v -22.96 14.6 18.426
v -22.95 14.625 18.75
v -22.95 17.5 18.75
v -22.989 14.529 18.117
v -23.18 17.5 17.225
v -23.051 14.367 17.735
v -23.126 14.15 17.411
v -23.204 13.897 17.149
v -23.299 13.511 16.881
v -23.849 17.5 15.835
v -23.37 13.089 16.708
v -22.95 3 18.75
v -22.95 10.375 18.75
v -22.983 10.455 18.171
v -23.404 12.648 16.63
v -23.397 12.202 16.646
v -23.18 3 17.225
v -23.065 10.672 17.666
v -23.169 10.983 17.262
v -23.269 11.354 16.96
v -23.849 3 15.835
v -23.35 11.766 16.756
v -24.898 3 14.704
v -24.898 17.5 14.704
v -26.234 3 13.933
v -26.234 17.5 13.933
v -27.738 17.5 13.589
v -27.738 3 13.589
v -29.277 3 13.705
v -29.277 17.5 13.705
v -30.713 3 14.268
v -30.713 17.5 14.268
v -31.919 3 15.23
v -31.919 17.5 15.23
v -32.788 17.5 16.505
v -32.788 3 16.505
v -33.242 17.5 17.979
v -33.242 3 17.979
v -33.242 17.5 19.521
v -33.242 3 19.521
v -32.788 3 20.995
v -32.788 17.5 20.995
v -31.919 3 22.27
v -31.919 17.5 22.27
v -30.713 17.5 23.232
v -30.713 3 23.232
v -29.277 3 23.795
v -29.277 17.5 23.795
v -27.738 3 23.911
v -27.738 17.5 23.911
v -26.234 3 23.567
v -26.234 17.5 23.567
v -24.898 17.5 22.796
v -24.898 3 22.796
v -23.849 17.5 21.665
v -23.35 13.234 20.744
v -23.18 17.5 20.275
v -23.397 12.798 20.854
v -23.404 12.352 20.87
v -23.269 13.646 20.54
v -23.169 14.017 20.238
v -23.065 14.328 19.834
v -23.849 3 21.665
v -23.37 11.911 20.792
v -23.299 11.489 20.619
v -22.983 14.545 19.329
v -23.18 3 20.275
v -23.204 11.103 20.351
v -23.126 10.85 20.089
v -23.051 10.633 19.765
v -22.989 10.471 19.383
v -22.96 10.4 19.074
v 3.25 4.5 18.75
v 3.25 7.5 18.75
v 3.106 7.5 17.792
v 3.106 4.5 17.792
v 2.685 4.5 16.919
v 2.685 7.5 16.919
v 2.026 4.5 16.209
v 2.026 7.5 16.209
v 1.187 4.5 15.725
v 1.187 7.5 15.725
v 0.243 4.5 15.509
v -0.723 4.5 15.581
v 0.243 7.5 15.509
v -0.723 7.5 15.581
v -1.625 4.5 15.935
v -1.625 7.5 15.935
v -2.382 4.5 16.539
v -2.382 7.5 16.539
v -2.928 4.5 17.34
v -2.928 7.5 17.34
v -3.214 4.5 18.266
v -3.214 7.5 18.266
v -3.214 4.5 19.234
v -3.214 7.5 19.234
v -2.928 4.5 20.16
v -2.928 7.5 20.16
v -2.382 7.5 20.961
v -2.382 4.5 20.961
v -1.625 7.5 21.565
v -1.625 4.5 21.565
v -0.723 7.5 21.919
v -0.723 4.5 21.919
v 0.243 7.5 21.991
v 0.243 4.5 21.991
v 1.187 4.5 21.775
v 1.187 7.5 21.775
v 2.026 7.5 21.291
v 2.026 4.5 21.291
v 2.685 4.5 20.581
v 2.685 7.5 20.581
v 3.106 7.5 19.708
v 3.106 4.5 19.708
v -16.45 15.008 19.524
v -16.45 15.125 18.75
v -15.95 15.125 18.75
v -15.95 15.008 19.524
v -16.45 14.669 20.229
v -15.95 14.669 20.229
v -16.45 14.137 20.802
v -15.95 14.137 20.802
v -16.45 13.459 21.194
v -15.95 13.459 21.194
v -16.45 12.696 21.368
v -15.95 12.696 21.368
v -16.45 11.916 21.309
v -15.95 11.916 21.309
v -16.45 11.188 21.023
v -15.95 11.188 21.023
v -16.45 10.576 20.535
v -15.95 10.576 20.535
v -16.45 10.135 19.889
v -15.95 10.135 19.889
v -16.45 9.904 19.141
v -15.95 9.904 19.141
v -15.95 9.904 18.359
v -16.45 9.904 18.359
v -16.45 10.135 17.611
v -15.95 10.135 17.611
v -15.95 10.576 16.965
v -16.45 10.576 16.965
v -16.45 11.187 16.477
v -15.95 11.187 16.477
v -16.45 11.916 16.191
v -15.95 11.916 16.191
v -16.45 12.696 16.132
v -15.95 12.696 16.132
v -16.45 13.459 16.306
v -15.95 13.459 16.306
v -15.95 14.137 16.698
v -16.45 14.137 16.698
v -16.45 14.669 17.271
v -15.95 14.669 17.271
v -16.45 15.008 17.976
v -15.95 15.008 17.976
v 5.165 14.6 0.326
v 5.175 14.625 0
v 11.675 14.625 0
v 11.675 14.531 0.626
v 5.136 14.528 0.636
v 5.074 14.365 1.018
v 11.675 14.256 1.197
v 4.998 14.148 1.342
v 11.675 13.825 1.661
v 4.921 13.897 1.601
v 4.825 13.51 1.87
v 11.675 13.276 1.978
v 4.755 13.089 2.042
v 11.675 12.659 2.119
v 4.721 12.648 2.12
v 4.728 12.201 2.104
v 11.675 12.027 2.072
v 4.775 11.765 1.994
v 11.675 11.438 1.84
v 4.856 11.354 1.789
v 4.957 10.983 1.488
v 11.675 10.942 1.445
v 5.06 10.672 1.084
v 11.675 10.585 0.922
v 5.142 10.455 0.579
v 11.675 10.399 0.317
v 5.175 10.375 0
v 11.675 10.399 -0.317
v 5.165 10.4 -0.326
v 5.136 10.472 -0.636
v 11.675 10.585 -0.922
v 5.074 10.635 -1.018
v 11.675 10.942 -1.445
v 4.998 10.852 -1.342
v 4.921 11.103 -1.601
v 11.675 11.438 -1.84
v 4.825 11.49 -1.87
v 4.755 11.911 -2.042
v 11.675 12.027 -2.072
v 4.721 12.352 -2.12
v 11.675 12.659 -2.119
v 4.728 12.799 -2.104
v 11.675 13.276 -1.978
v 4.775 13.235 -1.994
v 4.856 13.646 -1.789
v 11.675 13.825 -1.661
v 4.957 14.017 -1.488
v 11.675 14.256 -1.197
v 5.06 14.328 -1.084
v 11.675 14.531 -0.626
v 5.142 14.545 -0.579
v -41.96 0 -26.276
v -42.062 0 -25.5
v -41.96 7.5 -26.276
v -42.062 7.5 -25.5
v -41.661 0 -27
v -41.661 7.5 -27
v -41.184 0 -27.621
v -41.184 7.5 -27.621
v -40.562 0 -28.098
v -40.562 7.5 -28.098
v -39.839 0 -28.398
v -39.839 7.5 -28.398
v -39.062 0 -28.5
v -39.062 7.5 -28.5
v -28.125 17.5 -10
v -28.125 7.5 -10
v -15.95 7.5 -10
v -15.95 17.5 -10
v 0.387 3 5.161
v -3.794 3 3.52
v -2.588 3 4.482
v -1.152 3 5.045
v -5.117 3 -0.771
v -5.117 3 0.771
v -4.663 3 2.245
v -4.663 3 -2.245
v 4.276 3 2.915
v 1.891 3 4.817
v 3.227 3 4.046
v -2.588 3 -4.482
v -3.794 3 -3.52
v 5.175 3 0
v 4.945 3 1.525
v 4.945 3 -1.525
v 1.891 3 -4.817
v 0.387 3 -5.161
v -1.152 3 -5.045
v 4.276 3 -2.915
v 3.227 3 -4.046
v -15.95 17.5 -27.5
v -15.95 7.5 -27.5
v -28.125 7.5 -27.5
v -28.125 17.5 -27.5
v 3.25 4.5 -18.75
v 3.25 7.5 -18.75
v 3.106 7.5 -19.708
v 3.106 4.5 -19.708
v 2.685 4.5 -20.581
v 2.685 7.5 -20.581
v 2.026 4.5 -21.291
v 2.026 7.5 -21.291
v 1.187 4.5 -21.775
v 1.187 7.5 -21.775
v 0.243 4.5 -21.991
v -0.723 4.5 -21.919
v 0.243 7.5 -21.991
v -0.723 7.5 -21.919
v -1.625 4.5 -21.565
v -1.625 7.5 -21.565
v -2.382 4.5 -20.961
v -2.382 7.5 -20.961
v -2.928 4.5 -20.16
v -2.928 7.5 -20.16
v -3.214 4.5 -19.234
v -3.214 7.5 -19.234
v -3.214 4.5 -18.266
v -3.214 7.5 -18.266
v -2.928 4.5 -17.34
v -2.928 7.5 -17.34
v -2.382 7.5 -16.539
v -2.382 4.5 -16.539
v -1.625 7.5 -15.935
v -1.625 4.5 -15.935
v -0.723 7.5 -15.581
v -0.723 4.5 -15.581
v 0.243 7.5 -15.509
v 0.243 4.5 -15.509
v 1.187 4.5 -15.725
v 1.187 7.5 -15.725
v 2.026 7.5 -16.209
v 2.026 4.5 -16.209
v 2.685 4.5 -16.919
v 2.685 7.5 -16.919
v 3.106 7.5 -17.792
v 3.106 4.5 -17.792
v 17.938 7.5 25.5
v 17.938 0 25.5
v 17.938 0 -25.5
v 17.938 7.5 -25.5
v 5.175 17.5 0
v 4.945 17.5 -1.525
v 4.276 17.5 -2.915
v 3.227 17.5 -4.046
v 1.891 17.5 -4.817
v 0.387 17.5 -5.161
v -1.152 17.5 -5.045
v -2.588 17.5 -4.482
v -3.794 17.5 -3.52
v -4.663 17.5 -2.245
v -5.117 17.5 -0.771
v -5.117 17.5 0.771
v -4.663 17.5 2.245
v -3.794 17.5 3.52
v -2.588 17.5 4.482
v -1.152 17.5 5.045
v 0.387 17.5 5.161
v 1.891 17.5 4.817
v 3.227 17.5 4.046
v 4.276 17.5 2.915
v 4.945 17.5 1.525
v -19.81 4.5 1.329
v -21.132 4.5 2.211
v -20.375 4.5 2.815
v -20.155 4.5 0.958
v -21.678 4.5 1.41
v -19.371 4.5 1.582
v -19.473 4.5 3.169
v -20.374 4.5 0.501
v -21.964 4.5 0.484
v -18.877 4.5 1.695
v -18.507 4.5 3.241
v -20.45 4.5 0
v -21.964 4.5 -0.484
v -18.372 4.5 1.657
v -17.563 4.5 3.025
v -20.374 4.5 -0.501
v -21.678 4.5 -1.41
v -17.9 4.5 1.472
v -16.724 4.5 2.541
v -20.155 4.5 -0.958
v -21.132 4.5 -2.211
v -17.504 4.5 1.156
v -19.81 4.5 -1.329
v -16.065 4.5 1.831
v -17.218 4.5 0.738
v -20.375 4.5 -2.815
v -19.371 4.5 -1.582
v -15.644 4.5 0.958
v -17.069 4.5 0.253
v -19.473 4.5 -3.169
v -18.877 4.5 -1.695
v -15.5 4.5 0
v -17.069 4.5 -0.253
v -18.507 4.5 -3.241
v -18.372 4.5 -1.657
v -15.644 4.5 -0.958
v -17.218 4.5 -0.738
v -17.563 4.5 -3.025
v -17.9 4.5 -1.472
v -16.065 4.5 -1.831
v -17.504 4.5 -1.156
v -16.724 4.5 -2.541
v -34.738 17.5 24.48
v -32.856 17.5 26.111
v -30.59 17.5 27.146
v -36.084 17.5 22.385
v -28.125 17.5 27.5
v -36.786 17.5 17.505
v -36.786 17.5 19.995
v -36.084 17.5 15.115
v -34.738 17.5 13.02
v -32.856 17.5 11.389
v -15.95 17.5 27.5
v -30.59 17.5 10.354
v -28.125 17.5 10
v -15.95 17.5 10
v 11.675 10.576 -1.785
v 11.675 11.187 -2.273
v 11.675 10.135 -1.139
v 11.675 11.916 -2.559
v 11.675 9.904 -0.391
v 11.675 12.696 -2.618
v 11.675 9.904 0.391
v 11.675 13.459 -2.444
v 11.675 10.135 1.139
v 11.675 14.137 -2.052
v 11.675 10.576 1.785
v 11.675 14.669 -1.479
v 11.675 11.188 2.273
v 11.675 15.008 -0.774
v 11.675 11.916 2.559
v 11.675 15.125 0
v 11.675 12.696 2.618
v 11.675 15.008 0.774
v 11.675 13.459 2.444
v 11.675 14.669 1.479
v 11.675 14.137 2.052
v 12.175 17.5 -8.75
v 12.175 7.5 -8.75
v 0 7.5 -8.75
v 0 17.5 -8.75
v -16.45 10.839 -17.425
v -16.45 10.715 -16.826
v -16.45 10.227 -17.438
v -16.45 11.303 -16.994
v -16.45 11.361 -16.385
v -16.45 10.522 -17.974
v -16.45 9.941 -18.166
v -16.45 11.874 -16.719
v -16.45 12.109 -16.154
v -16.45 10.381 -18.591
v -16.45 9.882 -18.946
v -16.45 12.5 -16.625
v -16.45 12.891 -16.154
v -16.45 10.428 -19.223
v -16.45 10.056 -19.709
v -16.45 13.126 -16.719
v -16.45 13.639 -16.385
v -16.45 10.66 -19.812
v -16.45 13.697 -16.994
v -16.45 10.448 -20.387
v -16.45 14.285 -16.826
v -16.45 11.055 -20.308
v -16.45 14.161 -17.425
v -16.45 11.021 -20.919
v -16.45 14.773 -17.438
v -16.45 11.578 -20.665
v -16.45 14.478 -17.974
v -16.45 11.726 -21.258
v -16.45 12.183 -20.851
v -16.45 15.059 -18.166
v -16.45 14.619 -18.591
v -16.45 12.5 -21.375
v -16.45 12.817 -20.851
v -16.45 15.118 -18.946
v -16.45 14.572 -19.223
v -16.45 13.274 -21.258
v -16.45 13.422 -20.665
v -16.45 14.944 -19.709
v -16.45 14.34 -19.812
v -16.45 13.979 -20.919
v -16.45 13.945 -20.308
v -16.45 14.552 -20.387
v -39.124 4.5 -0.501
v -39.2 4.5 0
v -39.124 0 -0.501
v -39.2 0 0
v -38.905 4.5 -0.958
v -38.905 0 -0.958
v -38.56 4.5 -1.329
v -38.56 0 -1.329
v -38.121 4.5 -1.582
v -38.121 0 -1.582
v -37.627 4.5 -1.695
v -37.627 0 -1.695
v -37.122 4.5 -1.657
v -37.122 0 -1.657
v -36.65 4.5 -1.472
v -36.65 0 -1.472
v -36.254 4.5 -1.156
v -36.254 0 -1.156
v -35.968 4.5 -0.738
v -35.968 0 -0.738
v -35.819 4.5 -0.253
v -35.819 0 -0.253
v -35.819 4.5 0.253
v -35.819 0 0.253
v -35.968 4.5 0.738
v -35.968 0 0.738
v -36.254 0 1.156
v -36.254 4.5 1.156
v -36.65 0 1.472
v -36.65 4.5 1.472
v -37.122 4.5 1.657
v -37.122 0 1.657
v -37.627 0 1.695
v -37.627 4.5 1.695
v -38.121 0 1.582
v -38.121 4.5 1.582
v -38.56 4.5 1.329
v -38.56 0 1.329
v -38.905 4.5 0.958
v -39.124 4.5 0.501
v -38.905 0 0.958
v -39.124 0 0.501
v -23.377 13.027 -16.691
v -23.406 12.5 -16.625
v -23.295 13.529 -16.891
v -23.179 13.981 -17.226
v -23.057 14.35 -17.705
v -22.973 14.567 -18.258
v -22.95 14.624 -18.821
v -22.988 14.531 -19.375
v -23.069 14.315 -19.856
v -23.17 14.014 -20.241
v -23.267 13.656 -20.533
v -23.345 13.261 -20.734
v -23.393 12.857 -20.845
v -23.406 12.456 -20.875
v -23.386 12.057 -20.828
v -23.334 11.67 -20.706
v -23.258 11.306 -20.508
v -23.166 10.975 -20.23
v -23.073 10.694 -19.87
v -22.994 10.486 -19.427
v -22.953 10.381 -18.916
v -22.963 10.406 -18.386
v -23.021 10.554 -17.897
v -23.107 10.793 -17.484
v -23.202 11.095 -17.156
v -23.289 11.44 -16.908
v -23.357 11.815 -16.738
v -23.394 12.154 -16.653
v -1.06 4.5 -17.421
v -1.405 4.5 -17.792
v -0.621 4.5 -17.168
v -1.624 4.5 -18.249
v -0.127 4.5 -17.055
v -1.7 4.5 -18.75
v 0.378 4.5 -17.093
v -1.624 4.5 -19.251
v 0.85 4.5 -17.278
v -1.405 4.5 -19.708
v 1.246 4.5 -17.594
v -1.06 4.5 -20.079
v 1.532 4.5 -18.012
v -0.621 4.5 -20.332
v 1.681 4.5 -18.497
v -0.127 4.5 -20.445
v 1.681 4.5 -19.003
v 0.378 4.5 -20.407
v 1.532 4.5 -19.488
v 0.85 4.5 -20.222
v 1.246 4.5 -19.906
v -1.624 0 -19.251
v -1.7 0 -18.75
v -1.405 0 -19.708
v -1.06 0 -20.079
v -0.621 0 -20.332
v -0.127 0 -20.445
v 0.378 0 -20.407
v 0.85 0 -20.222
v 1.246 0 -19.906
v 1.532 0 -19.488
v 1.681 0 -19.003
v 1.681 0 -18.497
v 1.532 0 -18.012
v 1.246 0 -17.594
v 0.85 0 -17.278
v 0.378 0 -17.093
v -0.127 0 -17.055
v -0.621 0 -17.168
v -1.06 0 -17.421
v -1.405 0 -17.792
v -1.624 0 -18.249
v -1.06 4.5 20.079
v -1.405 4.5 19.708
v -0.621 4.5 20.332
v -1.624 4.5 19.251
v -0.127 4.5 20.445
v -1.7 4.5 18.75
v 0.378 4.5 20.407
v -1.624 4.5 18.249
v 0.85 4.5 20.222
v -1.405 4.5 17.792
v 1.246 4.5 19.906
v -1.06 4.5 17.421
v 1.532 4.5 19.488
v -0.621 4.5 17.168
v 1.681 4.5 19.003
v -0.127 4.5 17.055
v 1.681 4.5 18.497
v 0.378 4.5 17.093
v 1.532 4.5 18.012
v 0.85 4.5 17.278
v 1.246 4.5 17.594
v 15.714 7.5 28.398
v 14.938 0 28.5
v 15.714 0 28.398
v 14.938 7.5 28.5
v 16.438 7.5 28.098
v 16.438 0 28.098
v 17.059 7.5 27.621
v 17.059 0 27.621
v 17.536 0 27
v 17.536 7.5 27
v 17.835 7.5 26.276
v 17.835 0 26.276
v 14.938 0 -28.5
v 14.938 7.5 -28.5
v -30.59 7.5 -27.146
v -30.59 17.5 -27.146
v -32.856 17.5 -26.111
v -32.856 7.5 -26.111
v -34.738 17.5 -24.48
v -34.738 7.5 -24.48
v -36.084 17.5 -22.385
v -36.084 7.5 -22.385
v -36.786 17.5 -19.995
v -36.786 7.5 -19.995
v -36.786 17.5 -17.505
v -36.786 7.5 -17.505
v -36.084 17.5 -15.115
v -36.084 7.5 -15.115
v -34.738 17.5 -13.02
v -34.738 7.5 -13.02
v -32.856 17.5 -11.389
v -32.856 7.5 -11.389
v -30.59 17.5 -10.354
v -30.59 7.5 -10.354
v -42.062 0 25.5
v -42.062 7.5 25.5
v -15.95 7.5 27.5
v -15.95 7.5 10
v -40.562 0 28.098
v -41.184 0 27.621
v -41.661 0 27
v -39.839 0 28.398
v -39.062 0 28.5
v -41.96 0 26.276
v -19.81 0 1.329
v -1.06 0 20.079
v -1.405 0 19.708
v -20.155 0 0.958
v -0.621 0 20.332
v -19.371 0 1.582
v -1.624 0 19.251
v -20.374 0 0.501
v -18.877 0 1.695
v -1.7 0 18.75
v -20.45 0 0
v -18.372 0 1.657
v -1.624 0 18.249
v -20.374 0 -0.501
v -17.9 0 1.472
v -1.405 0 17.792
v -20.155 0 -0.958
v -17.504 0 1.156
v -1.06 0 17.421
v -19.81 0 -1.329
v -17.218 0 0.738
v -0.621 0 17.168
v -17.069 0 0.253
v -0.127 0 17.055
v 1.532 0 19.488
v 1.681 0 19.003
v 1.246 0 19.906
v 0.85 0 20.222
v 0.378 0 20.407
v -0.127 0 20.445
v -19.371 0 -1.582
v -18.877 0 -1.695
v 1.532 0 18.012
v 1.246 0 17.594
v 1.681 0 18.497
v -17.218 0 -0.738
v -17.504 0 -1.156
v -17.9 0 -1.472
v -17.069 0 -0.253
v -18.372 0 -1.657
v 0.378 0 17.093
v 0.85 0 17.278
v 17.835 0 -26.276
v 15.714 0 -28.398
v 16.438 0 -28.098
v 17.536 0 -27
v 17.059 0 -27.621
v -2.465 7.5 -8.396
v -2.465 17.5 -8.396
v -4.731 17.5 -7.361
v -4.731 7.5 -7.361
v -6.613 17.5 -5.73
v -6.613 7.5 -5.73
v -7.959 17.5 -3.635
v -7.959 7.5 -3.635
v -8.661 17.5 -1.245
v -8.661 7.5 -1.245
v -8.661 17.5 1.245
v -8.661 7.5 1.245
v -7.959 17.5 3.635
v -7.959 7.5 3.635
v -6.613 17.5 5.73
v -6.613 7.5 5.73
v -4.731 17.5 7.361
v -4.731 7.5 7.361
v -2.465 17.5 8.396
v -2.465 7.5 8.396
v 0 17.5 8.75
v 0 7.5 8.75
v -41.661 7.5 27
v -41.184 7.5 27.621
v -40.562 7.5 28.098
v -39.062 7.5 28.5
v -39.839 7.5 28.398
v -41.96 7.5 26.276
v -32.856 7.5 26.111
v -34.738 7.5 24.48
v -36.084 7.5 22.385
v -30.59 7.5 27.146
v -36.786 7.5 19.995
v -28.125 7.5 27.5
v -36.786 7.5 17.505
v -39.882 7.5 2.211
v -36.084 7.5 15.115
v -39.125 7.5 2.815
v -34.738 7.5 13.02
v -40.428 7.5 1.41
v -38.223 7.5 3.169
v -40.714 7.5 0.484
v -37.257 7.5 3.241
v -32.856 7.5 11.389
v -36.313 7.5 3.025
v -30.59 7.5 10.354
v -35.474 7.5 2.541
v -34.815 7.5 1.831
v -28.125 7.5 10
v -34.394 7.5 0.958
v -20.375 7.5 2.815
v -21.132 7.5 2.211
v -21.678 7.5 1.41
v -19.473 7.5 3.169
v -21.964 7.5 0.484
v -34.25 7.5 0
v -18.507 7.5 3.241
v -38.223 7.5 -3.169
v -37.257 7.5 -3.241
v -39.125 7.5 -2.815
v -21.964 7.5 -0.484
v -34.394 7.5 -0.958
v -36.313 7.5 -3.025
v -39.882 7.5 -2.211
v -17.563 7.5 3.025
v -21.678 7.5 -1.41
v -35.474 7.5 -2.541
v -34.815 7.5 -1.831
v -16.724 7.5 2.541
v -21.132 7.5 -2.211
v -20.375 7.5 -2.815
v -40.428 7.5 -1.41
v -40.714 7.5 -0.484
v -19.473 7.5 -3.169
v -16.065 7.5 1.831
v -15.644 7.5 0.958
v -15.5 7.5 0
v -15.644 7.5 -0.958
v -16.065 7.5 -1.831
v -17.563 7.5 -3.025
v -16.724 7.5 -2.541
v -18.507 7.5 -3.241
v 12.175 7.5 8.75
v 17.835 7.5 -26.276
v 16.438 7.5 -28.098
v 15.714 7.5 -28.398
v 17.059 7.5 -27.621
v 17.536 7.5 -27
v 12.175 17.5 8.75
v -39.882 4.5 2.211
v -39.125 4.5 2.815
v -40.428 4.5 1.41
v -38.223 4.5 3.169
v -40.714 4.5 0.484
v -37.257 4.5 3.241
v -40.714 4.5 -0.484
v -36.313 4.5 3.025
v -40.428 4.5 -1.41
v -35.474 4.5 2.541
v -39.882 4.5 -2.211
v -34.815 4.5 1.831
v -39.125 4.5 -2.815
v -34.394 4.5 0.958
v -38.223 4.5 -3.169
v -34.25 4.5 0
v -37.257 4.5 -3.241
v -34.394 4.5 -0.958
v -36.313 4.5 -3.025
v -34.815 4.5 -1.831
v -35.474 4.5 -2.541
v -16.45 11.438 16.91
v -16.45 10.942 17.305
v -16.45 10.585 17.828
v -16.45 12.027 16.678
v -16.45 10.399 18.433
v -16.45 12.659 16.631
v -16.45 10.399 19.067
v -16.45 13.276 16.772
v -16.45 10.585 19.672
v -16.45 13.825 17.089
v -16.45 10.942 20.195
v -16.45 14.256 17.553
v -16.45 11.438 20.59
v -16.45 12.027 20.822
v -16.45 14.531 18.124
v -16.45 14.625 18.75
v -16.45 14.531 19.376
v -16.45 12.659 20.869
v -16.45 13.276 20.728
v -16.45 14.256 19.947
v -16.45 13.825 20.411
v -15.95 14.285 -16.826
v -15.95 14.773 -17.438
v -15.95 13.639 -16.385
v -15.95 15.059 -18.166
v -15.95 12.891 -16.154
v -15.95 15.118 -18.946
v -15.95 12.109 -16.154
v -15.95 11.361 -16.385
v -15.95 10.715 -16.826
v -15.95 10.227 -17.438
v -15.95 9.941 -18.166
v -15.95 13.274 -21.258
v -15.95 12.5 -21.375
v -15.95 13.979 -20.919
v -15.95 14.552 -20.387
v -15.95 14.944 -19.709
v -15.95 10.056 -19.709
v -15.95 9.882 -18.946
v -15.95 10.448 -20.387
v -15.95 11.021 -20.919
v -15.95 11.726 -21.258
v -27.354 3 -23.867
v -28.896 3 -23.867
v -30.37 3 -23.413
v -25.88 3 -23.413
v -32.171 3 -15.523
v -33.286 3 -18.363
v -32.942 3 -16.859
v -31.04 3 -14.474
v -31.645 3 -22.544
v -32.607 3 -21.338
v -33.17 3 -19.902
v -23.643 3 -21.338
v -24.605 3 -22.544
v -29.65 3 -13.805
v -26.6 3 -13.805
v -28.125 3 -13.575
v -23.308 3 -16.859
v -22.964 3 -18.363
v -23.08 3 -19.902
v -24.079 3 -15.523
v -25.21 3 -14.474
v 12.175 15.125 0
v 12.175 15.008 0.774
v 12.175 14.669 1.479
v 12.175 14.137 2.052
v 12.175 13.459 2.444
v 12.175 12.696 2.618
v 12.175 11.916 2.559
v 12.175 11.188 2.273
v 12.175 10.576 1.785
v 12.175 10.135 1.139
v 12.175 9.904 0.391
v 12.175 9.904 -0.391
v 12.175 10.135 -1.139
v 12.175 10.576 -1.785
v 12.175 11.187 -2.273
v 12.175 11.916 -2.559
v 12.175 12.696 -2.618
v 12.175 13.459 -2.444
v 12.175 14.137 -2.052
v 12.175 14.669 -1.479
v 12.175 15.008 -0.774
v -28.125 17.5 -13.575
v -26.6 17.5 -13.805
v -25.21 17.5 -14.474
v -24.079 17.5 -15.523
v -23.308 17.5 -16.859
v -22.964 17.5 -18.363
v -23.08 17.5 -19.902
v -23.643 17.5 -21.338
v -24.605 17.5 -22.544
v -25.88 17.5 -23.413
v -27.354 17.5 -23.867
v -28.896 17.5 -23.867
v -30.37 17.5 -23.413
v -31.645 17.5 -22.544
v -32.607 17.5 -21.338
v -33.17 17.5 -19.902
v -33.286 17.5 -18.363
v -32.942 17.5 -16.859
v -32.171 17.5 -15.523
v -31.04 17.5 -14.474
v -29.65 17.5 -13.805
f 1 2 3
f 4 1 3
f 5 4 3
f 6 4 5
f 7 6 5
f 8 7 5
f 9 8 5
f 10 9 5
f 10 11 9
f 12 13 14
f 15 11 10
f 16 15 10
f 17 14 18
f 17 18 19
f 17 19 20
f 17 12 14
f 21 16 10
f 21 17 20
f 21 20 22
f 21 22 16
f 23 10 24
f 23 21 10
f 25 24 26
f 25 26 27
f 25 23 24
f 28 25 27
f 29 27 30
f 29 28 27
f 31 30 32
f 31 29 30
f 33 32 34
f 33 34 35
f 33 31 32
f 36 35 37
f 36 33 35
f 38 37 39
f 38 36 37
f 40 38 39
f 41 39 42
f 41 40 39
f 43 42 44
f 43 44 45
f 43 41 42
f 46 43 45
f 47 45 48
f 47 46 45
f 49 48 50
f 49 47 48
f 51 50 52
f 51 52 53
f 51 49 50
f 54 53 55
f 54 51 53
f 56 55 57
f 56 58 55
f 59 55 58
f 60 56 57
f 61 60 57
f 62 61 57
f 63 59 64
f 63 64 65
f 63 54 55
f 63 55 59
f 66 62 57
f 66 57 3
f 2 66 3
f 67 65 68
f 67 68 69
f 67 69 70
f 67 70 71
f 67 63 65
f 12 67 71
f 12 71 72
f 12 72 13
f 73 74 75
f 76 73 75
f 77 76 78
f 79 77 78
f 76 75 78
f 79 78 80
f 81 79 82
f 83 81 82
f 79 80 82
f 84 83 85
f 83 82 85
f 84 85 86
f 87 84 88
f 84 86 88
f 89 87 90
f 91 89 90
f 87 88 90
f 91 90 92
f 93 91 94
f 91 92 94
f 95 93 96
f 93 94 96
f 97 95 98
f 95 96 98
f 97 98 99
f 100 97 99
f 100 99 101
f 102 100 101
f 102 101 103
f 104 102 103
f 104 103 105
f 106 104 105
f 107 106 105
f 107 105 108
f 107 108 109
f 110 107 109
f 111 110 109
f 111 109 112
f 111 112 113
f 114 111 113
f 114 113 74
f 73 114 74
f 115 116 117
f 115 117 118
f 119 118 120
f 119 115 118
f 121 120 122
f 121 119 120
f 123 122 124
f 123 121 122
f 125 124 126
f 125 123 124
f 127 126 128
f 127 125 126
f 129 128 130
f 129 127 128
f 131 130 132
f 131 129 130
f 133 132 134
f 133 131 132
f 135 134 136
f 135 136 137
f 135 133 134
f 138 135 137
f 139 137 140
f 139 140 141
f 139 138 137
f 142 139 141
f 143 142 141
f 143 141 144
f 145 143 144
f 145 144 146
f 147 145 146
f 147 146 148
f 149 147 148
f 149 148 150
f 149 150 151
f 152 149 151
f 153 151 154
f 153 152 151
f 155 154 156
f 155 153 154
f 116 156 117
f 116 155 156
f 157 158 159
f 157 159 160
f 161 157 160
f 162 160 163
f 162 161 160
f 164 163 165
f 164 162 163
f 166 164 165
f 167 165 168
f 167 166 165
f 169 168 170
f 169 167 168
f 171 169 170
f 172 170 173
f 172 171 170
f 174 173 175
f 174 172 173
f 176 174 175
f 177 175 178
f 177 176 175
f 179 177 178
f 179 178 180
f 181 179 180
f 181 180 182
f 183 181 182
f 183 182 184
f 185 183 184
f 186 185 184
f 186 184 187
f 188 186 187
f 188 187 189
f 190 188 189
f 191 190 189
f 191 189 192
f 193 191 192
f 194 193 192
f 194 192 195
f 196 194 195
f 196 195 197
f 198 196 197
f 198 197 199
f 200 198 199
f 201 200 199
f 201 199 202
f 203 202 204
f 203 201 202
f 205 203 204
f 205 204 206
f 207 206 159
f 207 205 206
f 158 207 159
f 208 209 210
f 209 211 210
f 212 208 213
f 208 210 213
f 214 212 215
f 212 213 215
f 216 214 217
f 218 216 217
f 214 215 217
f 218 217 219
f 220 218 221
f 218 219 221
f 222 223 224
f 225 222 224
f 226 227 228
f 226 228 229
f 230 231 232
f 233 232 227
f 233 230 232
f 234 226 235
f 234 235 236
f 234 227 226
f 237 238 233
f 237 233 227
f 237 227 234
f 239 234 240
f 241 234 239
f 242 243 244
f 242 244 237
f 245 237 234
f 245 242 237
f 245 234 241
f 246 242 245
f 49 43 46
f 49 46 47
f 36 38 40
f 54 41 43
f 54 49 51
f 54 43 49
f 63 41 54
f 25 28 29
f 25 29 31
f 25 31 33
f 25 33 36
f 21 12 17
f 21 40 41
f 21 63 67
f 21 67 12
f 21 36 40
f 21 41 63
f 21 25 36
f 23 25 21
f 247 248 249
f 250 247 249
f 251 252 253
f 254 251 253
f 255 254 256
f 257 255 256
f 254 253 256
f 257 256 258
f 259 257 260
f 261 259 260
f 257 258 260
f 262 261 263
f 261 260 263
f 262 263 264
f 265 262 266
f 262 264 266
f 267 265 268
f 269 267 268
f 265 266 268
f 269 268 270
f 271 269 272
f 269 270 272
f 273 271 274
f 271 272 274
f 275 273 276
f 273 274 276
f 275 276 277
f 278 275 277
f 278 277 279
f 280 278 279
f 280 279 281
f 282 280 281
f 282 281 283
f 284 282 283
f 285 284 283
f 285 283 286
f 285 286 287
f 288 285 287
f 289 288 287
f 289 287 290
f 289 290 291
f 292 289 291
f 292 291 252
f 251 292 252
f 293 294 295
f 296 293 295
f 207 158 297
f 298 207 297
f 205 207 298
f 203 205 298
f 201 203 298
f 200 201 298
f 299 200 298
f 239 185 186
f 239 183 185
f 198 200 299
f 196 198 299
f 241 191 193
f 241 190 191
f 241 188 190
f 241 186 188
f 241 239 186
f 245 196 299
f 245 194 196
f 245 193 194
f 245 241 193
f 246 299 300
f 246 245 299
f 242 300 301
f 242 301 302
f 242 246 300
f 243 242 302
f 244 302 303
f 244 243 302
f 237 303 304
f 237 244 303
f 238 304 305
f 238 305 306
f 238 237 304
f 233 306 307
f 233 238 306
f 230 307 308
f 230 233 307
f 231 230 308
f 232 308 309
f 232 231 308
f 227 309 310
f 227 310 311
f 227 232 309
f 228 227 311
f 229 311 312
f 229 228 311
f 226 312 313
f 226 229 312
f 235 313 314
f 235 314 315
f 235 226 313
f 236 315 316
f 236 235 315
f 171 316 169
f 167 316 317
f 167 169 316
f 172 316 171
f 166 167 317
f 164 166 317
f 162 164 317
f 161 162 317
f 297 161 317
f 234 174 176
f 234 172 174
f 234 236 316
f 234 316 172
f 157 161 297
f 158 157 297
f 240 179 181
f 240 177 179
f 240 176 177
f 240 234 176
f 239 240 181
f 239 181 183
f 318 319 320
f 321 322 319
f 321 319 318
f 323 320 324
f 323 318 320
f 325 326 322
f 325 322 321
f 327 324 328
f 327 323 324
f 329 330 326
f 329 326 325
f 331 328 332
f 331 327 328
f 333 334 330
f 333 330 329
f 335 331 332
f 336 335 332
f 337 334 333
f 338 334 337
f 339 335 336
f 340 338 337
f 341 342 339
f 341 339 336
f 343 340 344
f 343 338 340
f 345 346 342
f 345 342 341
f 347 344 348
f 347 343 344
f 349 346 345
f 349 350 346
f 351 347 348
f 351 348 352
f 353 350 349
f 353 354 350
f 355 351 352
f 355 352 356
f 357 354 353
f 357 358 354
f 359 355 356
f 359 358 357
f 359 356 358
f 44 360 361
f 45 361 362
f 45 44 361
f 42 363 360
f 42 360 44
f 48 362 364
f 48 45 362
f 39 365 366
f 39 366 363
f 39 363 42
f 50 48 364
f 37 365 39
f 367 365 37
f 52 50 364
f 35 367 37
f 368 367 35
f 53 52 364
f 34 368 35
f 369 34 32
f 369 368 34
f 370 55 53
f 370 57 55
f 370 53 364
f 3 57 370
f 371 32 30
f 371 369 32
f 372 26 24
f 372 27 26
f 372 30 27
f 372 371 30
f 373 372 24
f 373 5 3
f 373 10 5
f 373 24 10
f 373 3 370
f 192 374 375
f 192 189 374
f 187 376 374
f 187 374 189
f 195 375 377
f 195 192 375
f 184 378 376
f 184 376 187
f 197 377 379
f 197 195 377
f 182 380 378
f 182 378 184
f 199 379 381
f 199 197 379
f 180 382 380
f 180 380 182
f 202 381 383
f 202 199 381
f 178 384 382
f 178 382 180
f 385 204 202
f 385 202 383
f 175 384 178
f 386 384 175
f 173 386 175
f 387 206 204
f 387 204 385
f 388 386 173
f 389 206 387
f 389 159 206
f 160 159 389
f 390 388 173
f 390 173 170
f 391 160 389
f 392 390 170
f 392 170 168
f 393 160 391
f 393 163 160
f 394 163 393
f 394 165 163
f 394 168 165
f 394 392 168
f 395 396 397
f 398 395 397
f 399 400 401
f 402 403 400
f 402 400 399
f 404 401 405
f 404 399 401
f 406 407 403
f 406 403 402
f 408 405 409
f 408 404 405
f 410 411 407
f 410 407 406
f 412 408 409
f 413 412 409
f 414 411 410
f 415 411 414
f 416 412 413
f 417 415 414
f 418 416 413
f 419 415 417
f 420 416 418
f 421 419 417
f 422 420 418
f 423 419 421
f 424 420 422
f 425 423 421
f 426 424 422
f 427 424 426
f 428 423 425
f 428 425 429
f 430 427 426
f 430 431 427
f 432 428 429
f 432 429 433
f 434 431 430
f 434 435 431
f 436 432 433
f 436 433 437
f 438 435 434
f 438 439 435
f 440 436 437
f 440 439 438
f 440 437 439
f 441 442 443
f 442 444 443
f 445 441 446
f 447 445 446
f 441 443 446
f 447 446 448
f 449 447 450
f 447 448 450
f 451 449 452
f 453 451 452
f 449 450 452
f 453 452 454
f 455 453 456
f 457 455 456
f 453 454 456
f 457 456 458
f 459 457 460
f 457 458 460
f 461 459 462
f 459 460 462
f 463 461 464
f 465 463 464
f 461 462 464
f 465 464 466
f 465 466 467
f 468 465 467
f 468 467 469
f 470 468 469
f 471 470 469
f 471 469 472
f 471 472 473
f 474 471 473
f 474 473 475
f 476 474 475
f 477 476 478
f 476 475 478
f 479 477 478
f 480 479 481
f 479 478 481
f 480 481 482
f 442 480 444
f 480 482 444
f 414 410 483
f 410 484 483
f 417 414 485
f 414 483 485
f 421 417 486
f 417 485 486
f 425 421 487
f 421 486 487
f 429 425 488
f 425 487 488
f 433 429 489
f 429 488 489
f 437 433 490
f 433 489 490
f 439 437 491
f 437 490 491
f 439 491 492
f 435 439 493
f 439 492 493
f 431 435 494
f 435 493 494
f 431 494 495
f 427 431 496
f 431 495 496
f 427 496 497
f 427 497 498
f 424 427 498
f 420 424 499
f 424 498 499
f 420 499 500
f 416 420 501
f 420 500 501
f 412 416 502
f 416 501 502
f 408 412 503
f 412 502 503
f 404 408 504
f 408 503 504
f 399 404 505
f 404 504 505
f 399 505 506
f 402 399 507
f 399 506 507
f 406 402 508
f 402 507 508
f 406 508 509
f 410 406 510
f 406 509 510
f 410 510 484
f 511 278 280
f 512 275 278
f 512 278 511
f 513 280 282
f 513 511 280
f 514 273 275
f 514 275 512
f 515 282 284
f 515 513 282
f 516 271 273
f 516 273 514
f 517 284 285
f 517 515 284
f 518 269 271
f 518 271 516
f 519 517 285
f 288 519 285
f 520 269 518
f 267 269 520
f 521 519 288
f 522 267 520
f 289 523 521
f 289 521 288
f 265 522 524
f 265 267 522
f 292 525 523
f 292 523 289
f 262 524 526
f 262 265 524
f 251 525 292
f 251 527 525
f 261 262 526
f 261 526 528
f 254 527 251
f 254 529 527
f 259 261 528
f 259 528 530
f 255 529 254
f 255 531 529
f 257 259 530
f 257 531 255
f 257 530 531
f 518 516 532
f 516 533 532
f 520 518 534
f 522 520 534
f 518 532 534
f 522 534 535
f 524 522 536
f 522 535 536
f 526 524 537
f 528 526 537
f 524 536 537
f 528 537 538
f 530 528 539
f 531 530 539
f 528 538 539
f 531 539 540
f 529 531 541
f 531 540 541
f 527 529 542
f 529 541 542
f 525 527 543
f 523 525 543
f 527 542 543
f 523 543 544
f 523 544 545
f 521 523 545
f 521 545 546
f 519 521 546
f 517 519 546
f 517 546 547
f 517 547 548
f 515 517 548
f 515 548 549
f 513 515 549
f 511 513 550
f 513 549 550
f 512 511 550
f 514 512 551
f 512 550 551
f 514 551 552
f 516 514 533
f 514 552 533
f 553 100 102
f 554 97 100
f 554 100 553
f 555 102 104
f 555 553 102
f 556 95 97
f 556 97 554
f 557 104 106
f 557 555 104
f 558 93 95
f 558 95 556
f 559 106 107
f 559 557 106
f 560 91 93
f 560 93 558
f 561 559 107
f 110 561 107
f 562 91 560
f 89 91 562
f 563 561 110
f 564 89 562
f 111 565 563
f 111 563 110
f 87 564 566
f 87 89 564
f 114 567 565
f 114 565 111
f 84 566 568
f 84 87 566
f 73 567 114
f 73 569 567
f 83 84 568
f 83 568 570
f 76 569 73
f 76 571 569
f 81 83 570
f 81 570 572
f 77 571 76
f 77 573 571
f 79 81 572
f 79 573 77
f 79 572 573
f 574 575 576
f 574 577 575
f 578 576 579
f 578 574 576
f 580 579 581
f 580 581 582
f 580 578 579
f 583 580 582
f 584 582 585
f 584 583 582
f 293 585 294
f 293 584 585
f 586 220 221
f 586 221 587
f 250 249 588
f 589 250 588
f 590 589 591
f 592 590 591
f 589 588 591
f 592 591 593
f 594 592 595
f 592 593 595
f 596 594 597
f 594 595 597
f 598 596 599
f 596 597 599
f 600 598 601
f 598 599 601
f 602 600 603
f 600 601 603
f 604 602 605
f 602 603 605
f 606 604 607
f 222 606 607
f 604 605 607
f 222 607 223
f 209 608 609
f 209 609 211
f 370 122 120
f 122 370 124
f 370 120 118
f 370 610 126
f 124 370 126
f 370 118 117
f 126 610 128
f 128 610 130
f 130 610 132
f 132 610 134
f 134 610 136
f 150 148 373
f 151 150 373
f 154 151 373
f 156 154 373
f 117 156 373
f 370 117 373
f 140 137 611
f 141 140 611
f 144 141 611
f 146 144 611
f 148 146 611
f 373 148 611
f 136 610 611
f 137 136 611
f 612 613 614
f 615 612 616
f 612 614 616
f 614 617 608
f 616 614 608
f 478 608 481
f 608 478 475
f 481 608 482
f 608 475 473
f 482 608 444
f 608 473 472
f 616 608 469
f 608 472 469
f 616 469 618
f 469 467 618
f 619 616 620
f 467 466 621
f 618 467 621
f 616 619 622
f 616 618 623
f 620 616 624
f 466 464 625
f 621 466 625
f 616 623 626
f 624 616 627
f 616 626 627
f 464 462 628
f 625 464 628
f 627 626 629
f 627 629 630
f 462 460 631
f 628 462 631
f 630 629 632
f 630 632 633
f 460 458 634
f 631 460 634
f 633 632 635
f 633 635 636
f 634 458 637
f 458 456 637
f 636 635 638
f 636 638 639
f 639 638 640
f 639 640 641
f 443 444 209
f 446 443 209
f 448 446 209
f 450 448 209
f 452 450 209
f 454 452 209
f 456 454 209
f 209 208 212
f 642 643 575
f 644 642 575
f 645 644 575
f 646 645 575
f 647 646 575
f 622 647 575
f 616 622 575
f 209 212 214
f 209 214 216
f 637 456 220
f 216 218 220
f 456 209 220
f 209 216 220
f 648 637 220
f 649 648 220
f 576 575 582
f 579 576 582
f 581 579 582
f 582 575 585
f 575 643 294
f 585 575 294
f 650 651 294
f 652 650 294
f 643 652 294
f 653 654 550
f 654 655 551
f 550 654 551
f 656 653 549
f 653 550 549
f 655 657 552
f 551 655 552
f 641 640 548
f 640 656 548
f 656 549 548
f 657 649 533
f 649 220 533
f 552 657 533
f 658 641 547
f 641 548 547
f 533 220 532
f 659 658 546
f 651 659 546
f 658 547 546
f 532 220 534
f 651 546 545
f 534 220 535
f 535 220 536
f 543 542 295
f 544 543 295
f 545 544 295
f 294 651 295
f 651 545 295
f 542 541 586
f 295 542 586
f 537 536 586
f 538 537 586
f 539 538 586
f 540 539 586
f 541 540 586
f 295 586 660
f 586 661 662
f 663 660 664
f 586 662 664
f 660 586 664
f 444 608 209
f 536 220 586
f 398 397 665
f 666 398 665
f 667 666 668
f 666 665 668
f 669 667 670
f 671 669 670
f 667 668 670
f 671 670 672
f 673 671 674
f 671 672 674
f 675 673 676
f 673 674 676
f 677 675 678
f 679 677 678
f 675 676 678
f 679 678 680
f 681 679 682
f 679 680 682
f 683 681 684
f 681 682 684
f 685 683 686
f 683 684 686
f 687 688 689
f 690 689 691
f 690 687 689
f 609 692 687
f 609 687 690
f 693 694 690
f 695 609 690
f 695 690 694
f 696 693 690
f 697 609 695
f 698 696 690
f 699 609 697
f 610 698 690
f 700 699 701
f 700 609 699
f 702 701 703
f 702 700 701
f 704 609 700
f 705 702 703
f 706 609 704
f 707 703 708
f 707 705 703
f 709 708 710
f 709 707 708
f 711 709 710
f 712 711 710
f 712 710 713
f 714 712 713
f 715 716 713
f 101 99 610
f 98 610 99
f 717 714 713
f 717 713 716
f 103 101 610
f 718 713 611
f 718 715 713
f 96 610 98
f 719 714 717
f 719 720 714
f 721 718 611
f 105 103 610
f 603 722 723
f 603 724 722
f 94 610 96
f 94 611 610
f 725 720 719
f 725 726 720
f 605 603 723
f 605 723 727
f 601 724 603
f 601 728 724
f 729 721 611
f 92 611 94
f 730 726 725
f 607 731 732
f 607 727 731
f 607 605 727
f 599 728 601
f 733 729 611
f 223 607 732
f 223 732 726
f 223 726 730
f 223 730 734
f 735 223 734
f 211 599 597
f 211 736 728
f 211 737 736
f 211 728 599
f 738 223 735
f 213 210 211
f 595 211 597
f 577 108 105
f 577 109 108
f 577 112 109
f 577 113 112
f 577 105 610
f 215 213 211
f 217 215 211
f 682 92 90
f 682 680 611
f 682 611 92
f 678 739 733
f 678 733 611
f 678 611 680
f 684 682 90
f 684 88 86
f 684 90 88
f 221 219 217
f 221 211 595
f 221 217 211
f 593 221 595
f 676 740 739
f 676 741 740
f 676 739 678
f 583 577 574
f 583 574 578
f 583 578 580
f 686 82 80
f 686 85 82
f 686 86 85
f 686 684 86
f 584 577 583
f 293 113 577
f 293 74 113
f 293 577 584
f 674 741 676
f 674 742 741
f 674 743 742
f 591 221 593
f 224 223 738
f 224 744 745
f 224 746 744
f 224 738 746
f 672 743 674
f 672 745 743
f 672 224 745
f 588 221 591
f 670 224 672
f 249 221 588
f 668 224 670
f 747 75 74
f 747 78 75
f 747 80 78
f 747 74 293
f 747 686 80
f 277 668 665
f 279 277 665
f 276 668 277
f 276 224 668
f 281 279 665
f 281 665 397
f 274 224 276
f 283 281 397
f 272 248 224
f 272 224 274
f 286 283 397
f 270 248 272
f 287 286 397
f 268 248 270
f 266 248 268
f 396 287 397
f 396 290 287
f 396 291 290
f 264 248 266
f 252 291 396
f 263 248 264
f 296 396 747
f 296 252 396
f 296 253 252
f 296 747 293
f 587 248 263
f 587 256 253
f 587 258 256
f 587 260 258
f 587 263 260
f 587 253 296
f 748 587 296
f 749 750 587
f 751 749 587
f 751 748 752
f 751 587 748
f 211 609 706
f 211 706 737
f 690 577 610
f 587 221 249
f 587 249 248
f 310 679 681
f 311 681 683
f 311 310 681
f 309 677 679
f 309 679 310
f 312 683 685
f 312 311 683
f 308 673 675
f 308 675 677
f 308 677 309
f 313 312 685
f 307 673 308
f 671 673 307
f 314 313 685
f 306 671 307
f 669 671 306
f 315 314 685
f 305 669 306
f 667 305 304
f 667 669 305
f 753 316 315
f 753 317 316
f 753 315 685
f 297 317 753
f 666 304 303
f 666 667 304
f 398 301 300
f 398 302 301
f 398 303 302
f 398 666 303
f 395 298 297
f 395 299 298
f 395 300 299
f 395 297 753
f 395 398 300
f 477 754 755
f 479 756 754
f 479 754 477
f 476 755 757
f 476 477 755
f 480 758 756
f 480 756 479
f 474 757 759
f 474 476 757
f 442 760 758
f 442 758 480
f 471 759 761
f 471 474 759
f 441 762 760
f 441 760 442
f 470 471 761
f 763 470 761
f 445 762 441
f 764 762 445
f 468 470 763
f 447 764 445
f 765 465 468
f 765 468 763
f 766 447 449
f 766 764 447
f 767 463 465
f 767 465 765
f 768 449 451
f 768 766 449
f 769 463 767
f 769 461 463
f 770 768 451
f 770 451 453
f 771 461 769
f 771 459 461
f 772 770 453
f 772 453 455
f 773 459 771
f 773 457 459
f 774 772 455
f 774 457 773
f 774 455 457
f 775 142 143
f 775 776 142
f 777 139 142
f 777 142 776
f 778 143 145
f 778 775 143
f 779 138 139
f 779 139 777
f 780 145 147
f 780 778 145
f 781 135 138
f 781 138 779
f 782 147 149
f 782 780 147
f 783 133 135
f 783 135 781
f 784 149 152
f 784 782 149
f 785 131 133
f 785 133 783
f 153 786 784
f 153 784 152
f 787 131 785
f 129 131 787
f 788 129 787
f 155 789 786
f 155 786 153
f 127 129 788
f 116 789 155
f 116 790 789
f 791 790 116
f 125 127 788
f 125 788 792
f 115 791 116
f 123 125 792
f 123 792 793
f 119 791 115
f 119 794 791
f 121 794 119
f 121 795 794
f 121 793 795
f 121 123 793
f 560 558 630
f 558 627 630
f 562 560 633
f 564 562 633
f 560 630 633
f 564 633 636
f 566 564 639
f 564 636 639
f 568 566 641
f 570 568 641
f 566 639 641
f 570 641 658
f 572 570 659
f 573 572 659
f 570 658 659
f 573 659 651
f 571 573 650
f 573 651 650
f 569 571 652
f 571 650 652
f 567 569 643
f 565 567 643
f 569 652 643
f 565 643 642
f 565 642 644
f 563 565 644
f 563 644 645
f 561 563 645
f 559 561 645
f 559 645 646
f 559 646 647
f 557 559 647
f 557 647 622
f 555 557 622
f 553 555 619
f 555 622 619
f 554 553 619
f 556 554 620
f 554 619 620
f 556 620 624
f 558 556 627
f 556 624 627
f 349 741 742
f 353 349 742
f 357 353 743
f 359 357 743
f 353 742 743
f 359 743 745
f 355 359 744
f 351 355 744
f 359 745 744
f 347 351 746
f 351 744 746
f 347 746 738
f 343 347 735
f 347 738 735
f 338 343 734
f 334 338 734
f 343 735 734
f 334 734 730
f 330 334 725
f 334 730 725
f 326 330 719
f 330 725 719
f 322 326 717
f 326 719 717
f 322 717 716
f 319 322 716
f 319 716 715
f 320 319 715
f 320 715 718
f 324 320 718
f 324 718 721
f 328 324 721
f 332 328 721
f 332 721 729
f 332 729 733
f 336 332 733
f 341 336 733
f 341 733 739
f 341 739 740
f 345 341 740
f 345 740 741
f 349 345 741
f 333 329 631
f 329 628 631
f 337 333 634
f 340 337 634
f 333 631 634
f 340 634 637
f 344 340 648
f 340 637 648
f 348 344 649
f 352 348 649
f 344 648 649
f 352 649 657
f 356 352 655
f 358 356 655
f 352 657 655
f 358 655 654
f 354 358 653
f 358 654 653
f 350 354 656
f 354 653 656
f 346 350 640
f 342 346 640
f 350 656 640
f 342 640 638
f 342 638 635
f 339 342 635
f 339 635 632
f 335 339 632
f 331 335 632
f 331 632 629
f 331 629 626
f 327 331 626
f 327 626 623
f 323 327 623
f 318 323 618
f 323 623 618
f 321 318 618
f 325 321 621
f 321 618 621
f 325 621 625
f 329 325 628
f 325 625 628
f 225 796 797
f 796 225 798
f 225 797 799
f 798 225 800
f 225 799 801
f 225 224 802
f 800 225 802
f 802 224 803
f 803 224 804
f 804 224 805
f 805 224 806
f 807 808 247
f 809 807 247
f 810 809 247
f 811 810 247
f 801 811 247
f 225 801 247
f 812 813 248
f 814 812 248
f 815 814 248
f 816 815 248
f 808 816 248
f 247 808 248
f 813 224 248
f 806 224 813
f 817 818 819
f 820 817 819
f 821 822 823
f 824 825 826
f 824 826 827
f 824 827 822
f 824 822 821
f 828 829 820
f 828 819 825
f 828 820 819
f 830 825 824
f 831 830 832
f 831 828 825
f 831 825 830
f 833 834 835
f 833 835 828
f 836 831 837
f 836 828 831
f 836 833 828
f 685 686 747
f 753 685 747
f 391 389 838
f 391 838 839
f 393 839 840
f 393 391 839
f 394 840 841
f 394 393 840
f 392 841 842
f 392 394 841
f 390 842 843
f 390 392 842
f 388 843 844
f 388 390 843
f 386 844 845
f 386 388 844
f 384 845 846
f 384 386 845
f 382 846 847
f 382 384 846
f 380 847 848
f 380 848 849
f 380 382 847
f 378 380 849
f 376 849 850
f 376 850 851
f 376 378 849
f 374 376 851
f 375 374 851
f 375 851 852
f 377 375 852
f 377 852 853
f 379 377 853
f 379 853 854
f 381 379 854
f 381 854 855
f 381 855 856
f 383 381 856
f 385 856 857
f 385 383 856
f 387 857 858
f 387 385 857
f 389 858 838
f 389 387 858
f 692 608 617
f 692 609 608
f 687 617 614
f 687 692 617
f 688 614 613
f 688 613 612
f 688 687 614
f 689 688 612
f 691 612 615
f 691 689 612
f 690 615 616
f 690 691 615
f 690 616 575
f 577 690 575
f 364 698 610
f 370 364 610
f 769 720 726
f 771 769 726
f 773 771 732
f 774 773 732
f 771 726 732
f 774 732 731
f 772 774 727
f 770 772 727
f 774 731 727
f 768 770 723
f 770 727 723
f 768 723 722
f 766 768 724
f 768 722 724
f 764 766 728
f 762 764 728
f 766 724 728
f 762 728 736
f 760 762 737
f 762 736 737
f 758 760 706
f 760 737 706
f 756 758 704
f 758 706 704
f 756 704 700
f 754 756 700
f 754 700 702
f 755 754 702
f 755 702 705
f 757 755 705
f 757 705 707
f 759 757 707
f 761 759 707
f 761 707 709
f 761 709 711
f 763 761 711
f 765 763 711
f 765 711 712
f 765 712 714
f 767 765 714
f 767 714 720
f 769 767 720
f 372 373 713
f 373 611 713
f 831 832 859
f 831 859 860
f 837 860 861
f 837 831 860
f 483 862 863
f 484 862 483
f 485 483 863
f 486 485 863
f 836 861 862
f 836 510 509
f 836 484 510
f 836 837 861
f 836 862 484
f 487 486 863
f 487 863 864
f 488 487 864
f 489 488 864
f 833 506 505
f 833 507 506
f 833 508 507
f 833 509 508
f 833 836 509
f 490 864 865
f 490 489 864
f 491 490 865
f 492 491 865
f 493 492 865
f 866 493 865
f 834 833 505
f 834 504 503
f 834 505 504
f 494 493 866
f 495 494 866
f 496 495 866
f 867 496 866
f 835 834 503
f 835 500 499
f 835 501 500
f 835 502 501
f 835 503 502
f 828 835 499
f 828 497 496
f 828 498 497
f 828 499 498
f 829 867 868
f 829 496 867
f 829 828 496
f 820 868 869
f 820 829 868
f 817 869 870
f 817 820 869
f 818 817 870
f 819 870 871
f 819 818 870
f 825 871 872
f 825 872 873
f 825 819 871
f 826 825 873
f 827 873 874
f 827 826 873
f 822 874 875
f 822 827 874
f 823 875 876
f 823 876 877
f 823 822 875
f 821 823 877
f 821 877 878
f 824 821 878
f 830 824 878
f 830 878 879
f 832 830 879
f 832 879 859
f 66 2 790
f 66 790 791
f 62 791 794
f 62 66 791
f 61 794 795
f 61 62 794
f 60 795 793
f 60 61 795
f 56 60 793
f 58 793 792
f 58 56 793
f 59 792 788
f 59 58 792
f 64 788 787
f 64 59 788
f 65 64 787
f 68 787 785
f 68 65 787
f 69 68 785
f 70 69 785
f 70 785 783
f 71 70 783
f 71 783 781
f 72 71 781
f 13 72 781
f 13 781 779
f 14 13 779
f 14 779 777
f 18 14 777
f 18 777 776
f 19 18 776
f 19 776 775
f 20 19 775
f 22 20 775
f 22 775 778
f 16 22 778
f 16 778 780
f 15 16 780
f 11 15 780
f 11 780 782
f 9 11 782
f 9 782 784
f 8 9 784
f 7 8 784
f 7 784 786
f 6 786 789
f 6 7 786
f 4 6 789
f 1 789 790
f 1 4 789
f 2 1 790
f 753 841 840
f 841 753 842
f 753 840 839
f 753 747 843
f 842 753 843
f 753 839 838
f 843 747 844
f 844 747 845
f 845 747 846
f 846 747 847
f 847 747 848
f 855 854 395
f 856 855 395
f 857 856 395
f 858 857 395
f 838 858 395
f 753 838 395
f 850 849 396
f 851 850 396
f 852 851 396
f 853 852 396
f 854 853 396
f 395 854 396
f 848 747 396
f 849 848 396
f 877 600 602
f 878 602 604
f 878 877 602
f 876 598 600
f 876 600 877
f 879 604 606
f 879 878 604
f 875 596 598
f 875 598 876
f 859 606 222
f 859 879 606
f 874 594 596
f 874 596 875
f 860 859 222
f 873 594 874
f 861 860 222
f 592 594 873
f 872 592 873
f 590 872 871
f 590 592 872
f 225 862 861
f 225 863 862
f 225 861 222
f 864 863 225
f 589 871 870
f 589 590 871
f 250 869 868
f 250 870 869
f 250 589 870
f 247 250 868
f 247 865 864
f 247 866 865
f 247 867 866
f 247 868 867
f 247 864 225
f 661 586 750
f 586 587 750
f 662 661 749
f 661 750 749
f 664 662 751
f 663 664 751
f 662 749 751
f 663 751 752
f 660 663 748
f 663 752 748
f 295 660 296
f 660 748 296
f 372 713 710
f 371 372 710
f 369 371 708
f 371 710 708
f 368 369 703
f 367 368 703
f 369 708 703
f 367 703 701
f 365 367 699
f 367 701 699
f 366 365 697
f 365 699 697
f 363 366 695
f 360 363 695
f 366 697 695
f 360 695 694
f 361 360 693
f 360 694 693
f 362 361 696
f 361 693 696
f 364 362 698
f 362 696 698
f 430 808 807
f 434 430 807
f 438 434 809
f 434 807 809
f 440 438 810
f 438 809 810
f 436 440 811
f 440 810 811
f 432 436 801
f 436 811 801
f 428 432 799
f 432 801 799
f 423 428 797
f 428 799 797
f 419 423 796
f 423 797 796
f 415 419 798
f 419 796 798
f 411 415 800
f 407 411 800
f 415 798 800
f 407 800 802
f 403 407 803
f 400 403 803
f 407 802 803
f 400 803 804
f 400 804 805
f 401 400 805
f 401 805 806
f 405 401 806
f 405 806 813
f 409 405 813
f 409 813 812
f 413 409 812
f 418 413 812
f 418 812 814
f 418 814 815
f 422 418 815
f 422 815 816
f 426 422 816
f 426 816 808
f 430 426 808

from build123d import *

# Parameters (mm, degrees)
SKETCH1_W                      = 60
SKETCH1_H                      = 57
BOSS_EXTRUDE1_DEPTH            = 7.5
SKETCH3_R                      = 8.75
SKETCH3_R_2                    = 5.175
BOSS_EXTRUDE2_DEPTH            = 10
CUT_EXTRUDE1_START             = -4.5
SKETCH4_R                      = 5.175
CUT_EXTRUDE1_DEPTH             = 4.5
CBORE_FOR_M3_SHCS2_D           = 4.25
CBORE_FOR_M3_SHCS2_DEPTH       = 10
CBORE_FOR_M3_SHCS2_CBORE_D     = 5.25
CBORE_FOR_M3_SHCS2_CBORE_DEPTH = 0.5
SKETCH_PATTERN1_START          = 3
SKETCH_PATTERN1_OUTLINE_R      = 5.175
SKETCH_PATTERN1_DEPTH          = 4.5
SKETCH_PATTERN1_START_2        = 15.125
SKETCH_PATTERN1_2_OUTLINE_R    = 5.175
SKETCH_PATTERN1_2_DEPTH        = 2.375
SKETCH_PATTERN1_START_3        = 7.5
SKETCH_PATTERN1_3_OUTLINE_R    = 5.175
SKETCH_PATTERN1_3_DEPTH        = 2.3749999
SKETCH_PATTERN1_START_4        = 9.8749999
SKETCH_PATTERN1_4_OUTLINE_R    = 5.175
SKETCH_PATTERN1_4_DEPTH        = 5.2500001
SKETCH_PATTERN1_START_5        = -24
SKETCH_PATTERN1_5_OUTLINE_R    = 2.125
SKETCH_PATTERN1_5_DEPTH        = 8.05
SKETCH_PATTERN1_START_6        = 4.718580183
SKETCH_PATTERN1_6_OUTLINE_R    = 2.125
SKETCH_PATTERN1_6_DEPTH        = 7.456419817
SKETCH_PATTERN1_START_7        = -16.45
SKETCH_PATTERN1_7_OUTLINE_R    = 2.625
SKETCH_PATTERN1_7_OUTLINE_R_2  = 2.125
SKETCH_PATTERN1_7_DEPTH        = 0.5
SKETCH_PATTERN1_START_8        = 11.675
SKETCH_PATTERN1_8_OUTLINE_R    = 2.625
SKETCH_PATTERN1_8_OUTLINE_R_2  = 2.125
SKETCH_PATTERN1_8_DEPTH        = 0.5
CBORE_FOR_M3_SHCS1_D           = 3.4
CBORE_FOR_M3_SHCS1_CBORE_D     = 6.5
CBORE_FOR_M3_SHCS1_CBORE_DEPTH = 3
FILLET2_R                      = 3


with BuildPart() as part:
    # Sketch1 → Boss-Extrude1 (new body)
    with BuildSketch(Plane(origin=(0, 0, 0), x_dir=(1, 0, 0), z_dir=(0, 1, 0))):
        with Locations((-12.0625, 0)):
            Rectangle(SKETCH1_W, SKETCH1_H)
    extrude(amount=BOSS_EXTRUDE1_DEPTH)

    # Sketch3 → Boss-Extrude2 (add)
    # profile 1 of 2: a face of its own
    with BuildSketch(Plane(origin=(0, 7.5, 0), x_dir=(1, 0, 0), z_dir=(0, 1, 0))):
        with Locations((-28.125, 18.75)):
            Circle(SKETCH3_R)
        with Locations(Location((-28.125, 18.75, 0), (0, 0, 270))):
            Circle(SKETCH3_R_2, mode=Mode.SUBTRACT)
    # profile 2 of 2: a face of its own
    with BuildSketch(Plane(origin=(0, 7.5, 0), x_dir=(1, 0, 0), z_dir=(0, 1, 0))):
        with BuildLine():
            Line((-15.95, 27.5), (-28.125, 27.5))
            ThreePointArc((-28.125, 27.5), (-21.937815665, 24.937184335), (-19.375, 18.75))
            ThreePointArc((-19.375, 18.75), (-21.937815665, 12.562815665), (-28.125, 10))
            Line((-28.125, 10), (-15.95, 10))
            Line((-15.95, 10), (-15.95, 27.5))
        make_face()
    extrude(amount=BOSS_EXTRUDE2_DEPTH)

    # Sketch4 → Cut-Extrude1 (cut)
    with BuildSketch(Plane(origin=(0, 7.5, 0), x_dir=(1, 0, 0), z_dir=(0, 1, 0)).offset(CUT_EXTRUDE1_START)):
        with Locations(Location((-28.125, 18.75, 0), (0, 0, 270))):
            Circle(SKETCH4_R)
    extrude(amount=CUT_EXTRUDE1_DEPTH, mode=Mode.SUBTRACT)

    # CBORE for M3 SHCS2
    with Locations(Plane(origin=(-15.95, 0, 0), x_dir=(0, 0, -1), z_dir=(1, 0, 0))):
        with Locations((18.75, 12.5)):
            CounterBoreHole(CBORE_FOR_M3_SHCS2_D / 2, CBORE_FOR_M3_SHCS2_CBORE_D / 2, CBORE_FOR_M3_SHCS2_CBORE_DEPTH, depth=CBORE_FOR_M3_SHCS2_DEPTH)

    # Sketch-Pattern1: read off the stored shape, not the designer's step
    # Sketch-Pattern1 outline → Sketch-Pattern1 (cut)
    with BuildSketch(Plane(origin=(0, 0, 0), x_dir=(1, 0, 0), z_dir=(0, 1, 0)).offset(SKETCH_PATTERN1_START)):
        Circle(SKETCH_PATTERN1_OUTLINE_R)
        with Locations((-28.125, -18.75)):
            Circle(SKETCH_PATTERN1_OUTLINE_R)
    extrude(amount=SKETCH_PATTERN1_DEPTH, mode=Mode.SUBTRACT)

    # Sketch-Pattern1 3 outline → Sketch-Pattern1 3 (add)
    # profile 1 of 2: a face of its own
    with BuildSketch(Plane(origin=(0, 0, 0), x_dir=(1, 0, 0), z_dir=(0, 1, 0)).offset(SKETCH_PATTERN1_START_3)):
        with BuildLine():
            Line((-28.125, -27.5), (-15.95, -27.5))
            Line((-15.95, -27.5), (-15.95, -10))
            Line((-15.95, -10), (-28.125, -10))
            ThreePointArc((-28.125, -10), (-36.875, -18.75), (-28.125, -27.5))
        make_face()
        with Locations((-28.125, -18.75)):
            Circle(SKETCH_PATTERN1_3_OUTLINE_R, mode=Mode.SUBTRACT)
    # profile 2 of 2: a face of its own
    with BuildSketch(Plane(origin=(0, 0, 0), x_dir=(1, 0, 0), z_dir=(0, 1, 0)).offset(SKETCH_PATTERN1_START_3)):
        with BuildLine():
            ThreePointArc((0, 8.75), (-8.75, 0), (0, -8.75))
            Line((0, -8.75), (12.175, -8.75))
            Line((12.175, -8.75), (12.175, 8.75))
            Line((12.175, 8.75), (0, 8.75))
        make_face()
        Circle(SKETCH_PATTERN1_3_OUTLINE_R, mode=Mode.SUBTRACT)
    extrude(amount=SKETCH_PATTERN1_3_DEPTH)



with BuildPart() as body_2:
    # Sketch-Pattern1 2 outline → Sketch-Pattern1 2 (new body)
    # profile 1 of 2: a face of its own
    with BuildSketch(Plane(origin=(0, 0, 0), x_dir=(1, 0, 0), z_dir=(0, 1, 0)).offset(SKETCH_PATTERN1_START_2)):
        with BuildLine():
            Line((-28.125, -27.5), (-15.95, -27.5))
            Line((-15.95, -27.5), (-15.95, -10))
            Line((-15.95, -10), (-28.125, -10))
            ThreePointArc((-28.125, -10), (-36.875, -18.75), (-28.125, -27.5))
        make_face()
        with Locations((-28.125, -18.75)):
            Circle(SKETCH_PATTERN1_2_OUTLINE_R, mode=Mode.SUBTRACT)
    # profile 2 of 2: a face of its own
    with BuildSketch(Plane(origin=(0, 0, 0), x_dir=(1, 0, 0), z_dir=(0, 1, 0)).offset(SKETCH_PATTERN1_START_2)):
        with BuildLine():
            ThreePointArc((0, 8.75), (-8.75, 0), (0, -8.75))
            Line((0, -8.75), (12.175, -8.75))
            Line((12.175, -8.75), (12.175, 8.75))
            Line((12.175, 8.75), (0, 8.75))
        make_face()
        Circle(SKETCH_PATTERN1_2_OUTLINE_R, mode=Mode.SUBTRACT)
    extrude(amount=SKETCH_PATTERN1_2_DEPTH)


with BuildPart() as part_1:
    add(part.part)

    add(body_2.part)  # Sketch-Pattern1 4 merges body 2
    # Sketch-Pattern1 4 outline → Sketch-Pattern1 4 (add)
    # profile 1 of 2: a face of its own
    with BuildSketch(Plane(origin=(0, 0, 0), x_dir=(1, 0, 0), z_dir=(0, 1, 0)).offset(SKETCH_PATTERN1_START_4)):
        with BuildLine():
            Line((-28.125, -27.5), (-15.95, -27.5))
            Line((-15.95, -27.5), (-15.95, -10))
            Line((-15.95, -10), (-28.125, -10))
            ThreePointArc((-28.125, -10), (-36.875, -18.75), (-28.125, -27.5))
        make_face()
        with Locations((-28.125, -18.75)):
            Circle(SKETCH_PATTERN1_4_OUTLINE_R, mode=Mode.SUBTRACT)
    # profile 2 of 2: a face of its own
    with BuildSketch(Plane(origin=(0, 0, 0), x_dir=(1, 0, 0), z_dir=(0, 1, 0)).offset(SKETCH_PATTERN1_START_4)):
        with BuildLine():
            ThreePointArc((0, 8.75), (-8.75, 0), (0, -8.75))
            Line((0, -8.75), (12.175, -8.75))
            Line((12.175, -8.75), (12.175, 8.75))
            Line((12.175, 8.75), (0, 8.75))
        make_face()
        Circle(SKETCH_PATTERN1_4_OUTLINE_R, mode=Mode.SUBTRACT)
    extrude(amount=SKETCH_PATTERN1_4_DEPTH)

    # Sketch-Pattern1 5 outline → Sketch-Pattern1 5 (cut)
    with BuildSketch(Plane.YZ.offset(SKETCH_PATTERN1_START_5)):
        with Locations((12.5, 18.75)):
            Circle(SKETCH_PATTERN1_5_OUTLINE_R)
    extrude(amount=SKETCH_PATTERN1_5_DEPTH, mode=Mode.SUBTRACT)

    # Sketch-Pattern1 6 outline → Sketch-Pattern1 6 (cut)
    with BuildSketch(Plane.YZ.offset(SKETCH_PATTERN1_START_6)):
        with Locations((12.5, 0)):
            Circle(SKETCH_PATTERN1_6_OUTLINE_R)
    extrude(amount=SKETCH_PATTERN1_6_DEPTH, mode=Mode.SUBTRACT)

    # Sketch-Pattern1 7 outline → Sketch-Pattern1 7 (cut)
    with BuildSketch(Plane.YZ.offset(SKETCH_PATTERN1_START_7)):
        with Locations((12.5, 18.75)):
            Circle(SKETCH_PATTERN1_7_OUTLINE_R)
        with Locations((12.5, 18.75)):
            Circle(SKETCH_PATTERN1_7_OUTLINE_R_2, mode=Mode.SUBTRACT)
    extrude(amount=SKETCH_PATTERN1_7_DEPTH, mode=Mode.SUBTRACT)

    # Sketch-Pattern1 8 outline → Sketch-Pattern1 8 (cut)
    with BuildSketch(Plane.YZ.offset(SKETCH_PATTERN1_START_8)):
        with Locations((12.5, 0)):
            Circle(SKETCH_PATTERN1_8_OUTLINE_R)
        with Locations((12.5, 0)):
            Circle(SKETCH_PATTERN1_8_OUTLINE_R_2, mode=Mode.SUBTRACT)
    extrude(amount=SKETCH_PATTERN1_8_DEPTH, mode=Mode.SUBTRACT)

    # CBORE for M3 SHCS1 (through all)
    with Locations(Plane(origin=(0, 7.5, 0), x_dir=(1, 0, 0), z_dir=(0, 1, 0))):
        with Locations((-37.5, 0), (0, 18.75), (-18.75, 0), (0, -18.75)):
            CounterBoreHole(CBORE_FOR_M3_SHCS1_D / 2, CBORE_FOR_M3_SHCS1_CBORE_D / 2, CBORE_FOR_M3_SHCS1_CBORE_DEPTH)

    # Fillet2
    fillet2_edges = [part_1.edges().sort_by_distance(p)[0] for p in [
        (-42.0625, 3.75, -28.5),
        (17.9375, 3.75, -28.5),
        (17.9375, 3.75, 28.5),
        (-42.0625, 3.75, 28.5),
    ]]
    fillet(fillet2_edges, radius=FILLET2_R)


solid = part_1.part
